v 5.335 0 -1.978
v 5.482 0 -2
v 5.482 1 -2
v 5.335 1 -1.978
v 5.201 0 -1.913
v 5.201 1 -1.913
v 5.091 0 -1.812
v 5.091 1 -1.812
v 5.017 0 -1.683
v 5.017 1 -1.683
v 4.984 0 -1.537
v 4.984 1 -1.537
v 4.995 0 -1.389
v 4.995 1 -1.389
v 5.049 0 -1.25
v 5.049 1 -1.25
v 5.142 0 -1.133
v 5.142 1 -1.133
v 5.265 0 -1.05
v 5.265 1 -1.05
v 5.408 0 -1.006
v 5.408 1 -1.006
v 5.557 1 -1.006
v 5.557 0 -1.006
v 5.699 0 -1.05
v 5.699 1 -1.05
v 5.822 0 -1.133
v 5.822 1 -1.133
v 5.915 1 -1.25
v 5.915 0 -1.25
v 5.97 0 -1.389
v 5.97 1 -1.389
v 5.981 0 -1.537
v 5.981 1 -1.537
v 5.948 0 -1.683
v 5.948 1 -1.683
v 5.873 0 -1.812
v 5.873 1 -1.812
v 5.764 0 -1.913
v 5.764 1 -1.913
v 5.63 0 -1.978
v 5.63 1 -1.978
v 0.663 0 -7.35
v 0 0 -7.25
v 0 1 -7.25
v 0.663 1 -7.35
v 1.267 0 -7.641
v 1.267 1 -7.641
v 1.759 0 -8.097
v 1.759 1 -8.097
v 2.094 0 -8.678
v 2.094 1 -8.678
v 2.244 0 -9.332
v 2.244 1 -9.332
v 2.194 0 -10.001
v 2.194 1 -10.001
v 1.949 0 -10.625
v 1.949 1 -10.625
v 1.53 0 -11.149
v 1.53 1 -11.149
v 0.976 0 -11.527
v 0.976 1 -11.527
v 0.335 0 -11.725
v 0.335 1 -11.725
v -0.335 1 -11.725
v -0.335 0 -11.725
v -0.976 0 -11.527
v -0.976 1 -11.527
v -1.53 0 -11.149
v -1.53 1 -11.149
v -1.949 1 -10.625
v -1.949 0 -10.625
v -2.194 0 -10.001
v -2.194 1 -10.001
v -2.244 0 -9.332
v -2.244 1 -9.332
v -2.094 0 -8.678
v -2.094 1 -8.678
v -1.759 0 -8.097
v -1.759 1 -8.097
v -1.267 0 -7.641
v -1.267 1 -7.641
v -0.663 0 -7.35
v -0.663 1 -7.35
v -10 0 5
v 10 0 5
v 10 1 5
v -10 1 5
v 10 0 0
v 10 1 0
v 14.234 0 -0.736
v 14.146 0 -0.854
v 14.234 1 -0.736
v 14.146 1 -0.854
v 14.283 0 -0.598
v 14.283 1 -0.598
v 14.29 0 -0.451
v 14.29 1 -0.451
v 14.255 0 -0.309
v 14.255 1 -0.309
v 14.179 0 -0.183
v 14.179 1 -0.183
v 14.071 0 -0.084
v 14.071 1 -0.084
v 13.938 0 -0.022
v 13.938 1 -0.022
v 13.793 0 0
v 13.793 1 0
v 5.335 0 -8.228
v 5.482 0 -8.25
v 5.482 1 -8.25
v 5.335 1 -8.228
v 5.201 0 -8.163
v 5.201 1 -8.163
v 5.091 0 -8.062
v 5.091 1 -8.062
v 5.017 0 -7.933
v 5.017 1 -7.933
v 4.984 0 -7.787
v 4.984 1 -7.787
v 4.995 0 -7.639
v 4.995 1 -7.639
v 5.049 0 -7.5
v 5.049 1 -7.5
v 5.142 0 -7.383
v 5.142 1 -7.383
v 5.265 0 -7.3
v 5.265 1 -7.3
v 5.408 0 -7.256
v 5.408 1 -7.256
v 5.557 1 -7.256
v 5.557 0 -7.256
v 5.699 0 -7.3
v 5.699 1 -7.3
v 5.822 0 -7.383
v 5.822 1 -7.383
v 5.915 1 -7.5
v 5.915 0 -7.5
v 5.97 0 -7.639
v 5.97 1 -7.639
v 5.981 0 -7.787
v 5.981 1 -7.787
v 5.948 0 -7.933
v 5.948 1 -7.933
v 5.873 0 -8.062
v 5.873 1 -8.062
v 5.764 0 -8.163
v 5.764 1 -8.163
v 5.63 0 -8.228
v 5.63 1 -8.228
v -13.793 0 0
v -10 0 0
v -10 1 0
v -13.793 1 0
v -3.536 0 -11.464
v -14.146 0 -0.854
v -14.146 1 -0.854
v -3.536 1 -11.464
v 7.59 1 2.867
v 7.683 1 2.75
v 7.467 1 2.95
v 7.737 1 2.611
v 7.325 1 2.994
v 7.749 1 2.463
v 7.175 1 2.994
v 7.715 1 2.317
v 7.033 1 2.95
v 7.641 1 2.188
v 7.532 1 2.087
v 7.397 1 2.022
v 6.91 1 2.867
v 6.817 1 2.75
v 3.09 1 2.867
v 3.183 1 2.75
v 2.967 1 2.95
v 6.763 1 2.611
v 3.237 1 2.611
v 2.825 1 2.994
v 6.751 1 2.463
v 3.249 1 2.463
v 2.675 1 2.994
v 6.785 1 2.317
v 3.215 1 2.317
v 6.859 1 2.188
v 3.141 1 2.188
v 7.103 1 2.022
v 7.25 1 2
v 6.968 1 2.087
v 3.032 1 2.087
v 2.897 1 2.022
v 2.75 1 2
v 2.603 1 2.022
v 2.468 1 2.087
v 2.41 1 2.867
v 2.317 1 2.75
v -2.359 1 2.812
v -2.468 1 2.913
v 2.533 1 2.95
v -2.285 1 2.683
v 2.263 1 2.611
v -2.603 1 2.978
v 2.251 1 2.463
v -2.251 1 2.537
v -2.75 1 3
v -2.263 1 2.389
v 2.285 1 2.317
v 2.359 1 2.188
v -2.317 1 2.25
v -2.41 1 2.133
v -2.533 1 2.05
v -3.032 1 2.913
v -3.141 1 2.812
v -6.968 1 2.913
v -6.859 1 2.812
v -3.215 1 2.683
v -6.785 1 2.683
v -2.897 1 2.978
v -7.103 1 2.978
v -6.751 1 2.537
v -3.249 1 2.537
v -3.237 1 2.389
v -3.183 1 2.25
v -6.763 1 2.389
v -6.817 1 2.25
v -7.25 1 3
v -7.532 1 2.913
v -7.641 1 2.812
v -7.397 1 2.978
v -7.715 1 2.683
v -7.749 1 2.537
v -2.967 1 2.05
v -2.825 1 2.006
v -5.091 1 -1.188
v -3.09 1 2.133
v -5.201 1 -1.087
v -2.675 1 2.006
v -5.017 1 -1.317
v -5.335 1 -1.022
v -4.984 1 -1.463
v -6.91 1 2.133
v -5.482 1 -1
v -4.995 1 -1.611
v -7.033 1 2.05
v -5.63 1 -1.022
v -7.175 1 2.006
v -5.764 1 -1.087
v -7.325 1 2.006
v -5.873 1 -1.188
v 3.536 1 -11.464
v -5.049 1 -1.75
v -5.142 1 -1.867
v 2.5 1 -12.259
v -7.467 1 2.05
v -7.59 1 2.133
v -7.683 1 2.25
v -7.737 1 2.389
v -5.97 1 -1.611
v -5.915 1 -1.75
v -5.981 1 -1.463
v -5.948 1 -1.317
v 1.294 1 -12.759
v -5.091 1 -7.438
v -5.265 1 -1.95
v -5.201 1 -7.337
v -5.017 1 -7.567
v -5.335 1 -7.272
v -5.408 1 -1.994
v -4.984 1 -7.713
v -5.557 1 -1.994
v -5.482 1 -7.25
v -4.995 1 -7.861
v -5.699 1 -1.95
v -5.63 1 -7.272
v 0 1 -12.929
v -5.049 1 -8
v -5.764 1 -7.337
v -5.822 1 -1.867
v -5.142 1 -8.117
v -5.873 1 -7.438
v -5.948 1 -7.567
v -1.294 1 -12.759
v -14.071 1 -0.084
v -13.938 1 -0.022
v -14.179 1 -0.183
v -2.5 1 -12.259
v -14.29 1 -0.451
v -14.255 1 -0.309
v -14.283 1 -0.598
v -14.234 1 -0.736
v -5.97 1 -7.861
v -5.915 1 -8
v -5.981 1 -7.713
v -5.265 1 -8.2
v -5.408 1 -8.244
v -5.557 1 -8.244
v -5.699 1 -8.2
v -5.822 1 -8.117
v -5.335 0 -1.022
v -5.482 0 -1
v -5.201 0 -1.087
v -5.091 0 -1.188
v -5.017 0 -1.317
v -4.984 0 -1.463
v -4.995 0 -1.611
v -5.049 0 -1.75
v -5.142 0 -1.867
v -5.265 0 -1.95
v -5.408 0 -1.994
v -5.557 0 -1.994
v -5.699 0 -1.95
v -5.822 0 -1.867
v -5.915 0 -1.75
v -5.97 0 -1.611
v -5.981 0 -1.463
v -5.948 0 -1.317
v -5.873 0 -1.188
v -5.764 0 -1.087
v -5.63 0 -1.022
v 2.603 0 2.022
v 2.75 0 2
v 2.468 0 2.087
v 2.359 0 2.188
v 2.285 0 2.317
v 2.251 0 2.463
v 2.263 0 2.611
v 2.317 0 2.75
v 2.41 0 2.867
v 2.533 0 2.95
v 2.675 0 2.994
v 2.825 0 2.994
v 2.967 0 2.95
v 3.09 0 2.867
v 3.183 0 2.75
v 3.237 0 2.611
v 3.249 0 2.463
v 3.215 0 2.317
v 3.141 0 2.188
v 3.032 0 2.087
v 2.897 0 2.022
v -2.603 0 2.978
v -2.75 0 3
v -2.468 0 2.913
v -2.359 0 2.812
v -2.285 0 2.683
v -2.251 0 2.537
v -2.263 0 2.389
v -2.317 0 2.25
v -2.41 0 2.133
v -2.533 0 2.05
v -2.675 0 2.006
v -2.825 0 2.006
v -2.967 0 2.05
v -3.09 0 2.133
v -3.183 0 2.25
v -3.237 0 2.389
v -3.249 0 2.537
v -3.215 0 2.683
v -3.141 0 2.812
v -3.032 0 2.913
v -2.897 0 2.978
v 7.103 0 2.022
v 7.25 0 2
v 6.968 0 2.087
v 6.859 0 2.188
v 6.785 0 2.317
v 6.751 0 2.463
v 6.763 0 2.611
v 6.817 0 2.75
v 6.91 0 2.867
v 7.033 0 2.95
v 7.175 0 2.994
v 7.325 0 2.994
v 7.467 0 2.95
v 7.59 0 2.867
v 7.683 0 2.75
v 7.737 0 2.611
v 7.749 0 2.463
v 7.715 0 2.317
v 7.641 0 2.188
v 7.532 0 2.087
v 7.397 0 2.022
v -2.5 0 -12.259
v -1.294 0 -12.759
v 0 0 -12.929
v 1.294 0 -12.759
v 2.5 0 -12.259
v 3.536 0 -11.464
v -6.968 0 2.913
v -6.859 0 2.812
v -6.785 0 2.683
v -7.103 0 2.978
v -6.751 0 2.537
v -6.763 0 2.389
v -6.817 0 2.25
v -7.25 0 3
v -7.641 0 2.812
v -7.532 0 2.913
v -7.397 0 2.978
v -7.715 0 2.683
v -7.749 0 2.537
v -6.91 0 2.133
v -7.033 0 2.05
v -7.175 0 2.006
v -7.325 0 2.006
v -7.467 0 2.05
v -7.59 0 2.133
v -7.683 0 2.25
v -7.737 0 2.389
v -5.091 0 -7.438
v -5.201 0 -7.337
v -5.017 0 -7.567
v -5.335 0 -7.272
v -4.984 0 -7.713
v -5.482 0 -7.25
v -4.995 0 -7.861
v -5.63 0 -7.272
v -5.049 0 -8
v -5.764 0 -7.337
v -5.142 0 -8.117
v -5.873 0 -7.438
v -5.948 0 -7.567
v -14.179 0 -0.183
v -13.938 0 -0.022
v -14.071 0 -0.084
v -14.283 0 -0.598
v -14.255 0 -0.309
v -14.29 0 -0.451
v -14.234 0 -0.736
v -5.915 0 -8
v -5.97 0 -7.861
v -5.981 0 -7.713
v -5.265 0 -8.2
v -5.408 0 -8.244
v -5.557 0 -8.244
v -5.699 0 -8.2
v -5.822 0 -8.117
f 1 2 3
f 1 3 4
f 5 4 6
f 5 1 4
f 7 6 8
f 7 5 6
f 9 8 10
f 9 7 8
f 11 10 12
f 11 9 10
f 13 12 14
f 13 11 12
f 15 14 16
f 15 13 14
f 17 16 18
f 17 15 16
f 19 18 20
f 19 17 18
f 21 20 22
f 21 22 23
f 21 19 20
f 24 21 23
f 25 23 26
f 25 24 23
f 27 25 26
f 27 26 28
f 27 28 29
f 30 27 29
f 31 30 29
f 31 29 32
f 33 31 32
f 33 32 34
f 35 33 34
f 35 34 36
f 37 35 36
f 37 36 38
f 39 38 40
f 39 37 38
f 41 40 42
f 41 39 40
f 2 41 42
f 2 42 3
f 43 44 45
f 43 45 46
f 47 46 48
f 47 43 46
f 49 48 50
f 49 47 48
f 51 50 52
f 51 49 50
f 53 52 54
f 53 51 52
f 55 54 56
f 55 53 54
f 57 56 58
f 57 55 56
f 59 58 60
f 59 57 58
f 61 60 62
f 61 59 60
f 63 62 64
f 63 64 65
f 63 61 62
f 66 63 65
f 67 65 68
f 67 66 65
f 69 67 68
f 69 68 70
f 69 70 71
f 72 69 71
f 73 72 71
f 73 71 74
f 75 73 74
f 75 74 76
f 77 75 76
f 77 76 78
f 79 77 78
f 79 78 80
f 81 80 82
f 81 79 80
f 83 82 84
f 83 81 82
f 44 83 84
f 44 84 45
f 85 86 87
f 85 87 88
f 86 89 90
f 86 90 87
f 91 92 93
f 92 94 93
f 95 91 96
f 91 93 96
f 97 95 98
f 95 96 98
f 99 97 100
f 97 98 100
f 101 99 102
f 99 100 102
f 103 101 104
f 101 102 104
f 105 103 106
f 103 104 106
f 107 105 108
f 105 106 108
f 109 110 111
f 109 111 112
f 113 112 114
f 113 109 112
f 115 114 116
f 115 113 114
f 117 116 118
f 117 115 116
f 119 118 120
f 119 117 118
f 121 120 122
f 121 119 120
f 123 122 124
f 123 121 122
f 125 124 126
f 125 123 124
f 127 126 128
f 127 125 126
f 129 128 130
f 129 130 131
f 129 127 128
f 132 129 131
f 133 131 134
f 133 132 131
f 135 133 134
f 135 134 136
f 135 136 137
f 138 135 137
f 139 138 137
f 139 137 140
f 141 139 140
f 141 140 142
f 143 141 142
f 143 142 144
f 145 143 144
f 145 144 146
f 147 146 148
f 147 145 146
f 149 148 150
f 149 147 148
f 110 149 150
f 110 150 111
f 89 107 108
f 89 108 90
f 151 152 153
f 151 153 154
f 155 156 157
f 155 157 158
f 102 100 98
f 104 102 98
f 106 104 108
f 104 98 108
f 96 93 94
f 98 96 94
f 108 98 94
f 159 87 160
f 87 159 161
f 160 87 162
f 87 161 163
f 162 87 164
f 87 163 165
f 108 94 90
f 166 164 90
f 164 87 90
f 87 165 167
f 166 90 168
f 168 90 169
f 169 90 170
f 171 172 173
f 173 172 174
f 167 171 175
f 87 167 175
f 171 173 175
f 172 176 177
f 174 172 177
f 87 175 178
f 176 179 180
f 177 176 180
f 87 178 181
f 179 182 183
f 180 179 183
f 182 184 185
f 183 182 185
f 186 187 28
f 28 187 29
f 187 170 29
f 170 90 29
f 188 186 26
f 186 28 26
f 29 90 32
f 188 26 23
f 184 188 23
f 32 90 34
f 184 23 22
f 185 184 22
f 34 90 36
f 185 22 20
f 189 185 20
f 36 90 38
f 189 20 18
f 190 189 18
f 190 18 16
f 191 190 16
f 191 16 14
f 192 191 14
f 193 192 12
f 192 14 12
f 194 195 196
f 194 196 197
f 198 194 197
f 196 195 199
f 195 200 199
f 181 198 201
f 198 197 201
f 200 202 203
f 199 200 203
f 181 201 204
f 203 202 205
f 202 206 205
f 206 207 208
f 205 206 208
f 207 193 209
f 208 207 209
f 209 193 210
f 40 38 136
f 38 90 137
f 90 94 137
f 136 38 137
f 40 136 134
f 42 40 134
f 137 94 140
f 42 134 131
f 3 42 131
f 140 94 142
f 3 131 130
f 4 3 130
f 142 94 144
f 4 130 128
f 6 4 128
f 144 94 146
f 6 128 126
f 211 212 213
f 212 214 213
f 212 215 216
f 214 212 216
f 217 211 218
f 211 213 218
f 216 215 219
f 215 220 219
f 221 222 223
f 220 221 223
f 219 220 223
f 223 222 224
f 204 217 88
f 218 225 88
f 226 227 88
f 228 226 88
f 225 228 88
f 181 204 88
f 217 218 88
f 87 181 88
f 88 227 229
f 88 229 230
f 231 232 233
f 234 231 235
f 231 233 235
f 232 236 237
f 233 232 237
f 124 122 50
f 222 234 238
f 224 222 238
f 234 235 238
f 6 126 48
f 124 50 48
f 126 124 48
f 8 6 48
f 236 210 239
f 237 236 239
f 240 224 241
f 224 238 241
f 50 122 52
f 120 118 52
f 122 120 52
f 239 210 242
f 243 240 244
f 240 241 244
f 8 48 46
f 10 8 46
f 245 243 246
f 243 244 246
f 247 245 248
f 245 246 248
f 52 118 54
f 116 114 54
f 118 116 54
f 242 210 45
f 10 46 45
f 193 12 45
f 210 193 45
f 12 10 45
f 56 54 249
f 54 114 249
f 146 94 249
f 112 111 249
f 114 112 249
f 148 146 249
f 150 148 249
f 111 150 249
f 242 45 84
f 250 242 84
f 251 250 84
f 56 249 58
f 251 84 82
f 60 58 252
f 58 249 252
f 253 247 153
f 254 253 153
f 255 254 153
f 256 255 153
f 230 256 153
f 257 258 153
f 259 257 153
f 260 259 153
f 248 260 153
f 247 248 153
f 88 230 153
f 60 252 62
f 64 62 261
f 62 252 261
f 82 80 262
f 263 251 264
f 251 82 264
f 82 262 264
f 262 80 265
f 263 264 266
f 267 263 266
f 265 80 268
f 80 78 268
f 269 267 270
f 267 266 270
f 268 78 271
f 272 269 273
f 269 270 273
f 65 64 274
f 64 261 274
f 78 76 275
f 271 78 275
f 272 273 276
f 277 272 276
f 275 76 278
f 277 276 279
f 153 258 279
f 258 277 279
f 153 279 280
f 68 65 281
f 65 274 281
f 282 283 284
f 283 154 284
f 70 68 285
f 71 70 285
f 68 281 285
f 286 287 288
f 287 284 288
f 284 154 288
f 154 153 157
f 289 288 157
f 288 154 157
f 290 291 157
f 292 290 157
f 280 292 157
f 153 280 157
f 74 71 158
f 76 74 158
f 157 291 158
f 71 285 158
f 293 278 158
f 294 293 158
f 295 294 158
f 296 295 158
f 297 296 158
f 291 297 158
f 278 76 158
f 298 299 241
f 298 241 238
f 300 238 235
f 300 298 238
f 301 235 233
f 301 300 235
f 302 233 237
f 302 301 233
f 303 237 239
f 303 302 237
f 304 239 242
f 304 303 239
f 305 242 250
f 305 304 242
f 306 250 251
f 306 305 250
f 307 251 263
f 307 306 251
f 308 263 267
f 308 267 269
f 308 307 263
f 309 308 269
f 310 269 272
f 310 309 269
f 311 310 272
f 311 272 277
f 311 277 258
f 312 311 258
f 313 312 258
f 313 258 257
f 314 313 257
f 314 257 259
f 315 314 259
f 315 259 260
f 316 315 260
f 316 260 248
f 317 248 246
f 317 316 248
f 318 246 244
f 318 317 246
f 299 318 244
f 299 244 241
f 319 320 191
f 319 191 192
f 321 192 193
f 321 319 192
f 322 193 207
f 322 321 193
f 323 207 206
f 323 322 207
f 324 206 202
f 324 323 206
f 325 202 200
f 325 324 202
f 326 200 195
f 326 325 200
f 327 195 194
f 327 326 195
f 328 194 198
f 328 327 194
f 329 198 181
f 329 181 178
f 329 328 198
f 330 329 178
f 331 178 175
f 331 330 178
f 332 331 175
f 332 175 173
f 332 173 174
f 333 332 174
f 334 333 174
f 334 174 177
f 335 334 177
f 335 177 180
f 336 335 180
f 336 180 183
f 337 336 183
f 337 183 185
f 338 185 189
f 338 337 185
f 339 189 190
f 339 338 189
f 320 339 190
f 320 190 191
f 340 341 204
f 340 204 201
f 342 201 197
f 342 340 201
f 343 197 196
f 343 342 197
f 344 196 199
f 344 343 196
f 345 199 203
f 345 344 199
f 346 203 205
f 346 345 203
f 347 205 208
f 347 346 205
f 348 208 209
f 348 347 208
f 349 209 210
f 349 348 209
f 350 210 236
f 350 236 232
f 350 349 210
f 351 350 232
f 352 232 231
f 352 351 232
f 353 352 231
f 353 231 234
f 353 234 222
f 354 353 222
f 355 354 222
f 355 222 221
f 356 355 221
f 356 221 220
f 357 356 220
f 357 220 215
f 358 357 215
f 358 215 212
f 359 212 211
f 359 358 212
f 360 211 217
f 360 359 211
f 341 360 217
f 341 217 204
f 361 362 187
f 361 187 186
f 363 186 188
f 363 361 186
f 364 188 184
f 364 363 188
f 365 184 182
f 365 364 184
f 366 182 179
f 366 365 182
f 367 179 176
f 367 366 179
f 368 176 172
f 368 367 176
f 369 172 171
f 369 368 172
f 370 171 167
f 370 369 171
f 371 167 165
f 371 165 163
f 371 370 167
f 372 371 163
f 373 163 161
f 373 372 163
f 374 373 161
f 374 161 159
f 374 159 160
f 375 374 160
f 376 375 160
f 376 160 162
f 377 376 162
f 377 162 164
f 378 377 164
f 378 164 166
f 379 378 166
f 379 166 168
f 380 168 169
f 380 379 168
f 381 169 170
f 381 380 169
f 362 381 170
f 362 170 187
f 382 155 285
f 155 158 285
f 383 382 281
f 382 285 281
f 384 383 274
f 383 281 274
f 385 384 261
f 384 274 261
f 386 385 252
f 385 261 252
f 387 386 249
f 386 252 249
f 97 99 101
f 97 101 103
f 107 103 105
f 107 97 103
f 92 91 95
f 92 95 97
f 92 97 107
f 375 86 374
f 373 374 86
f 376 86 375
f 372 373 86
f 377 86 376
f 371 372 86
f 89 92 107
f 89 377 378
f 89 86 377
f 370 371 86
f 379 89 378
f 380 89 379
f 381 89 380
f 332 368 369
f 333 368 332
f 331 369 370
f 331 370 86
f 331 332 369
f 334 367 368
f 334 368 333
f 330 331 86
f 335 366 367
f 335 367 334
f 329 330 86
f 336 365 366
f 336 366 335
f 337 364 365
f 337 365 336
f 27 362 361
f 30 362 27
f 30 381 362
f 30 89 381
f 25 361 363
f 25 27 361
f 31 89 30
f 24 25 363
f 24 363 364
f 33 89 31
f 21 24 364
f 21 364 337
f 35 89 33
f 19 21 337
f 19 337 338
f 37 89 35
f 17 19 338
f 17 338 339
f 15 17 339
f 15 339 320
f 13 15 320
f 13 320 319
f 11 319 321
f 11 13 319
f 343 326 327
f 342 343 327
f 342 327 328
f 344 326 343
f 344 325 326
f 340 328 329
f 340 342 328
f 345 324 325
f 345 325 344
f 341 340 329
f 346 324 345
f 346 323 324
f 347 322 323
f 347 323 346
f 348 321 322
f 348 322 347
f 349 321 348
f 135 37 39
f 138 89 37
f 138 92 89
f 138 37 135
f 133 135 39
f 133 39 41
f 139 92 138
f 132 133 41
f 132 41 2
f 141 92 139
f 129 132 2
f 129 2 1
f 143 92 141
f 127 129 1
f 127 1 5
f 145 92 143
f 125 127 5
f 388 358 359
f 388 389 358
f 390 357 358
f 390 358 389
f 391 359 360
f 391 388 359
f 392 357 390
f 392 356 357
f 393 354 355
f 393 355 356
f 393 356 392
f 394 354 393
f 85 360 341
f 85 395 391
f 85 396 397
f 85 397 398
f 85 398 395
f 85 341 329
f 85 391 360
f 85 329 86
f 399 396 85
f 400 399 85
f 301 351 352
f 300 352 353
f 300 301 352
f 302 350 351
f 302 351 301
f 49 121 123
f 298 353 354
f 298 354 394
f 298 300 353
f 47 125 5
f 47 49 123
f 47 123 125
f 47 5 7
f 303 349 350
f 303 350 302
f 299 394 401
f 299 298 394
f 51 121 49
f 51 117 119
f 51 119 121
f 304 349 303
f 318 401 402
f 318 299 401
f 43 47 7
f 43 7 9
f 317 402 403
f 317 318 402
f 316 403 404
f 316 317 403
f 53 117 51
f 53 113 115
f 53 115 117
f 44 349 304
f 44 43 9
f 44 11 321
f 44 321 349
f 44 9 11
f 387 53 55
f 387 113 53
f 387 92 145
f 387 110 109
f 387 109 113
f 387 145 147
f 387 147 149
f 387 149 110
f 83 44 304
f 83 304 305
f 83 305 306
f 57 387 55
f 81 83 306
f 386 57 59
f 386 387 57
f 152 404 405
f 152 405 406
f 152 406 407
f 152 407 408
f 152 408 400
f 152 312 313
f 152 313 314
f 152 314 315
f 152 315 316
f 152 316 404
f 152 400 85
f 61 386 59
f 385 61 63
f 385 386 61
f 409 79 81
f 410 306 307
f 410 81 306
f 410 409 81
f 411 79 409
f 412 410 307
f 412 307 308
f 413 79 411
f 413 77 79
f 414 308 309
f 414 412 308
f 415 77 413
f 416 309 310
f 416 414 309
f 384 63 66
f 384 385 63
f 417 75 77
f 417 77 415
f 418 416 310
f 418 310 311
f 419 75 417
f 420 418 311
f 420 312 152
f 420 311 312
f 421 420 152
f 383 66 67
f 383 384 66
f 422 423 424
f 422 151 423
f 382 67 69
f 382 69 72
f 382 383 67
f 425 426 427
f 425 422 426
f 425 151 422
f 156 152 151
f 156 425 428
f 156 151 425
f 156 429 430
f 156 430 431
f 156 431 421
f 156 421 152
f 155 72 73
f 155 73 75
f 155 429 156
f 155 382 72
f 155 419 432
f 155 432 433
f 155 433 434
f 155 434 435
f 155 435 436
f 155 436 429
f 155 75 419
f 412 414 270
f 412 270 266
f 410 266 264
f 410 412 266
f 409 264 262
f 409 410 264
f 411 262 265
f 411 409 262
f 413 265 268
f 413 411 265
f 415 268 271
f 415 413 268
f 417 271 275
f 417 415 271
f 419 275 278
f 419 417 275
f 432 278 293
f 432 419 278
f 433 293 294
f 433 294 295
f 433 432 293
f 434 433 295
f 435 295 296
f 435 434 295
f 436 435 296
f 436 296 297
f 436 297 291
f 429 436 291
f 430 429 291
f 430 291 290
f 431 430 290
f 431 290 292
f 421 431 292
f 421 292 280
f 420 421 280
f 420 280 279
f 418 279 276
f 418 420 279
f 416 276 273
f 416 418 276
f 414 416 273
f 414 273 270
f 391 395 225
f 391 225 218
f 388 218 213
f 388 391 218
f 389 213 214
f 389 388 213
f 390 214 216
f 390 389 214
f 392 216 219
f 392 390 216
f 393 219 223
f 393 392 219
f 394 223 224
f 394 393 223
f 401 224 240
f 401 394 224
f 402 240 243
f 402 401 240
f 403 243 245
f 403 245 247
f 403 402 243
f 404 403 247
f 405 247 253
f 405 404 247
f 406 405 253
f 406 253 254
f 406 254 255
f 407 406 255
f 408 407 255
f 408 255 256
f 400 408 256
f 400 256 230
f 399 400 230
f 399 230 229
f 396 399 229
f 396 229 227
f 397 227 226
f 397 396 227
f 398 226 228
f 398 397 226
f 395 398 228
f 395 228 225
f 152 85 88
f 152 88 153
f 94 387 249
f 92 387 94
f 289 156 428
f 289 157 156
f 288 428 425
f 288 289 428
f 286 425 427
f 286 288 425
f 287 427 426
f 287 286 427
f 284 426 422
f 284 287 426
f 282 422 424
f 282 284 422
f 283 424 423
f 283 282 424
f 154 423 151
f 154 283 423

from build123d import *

# Parameters (mm, degrees)
SKETCH_1_R      = 2.25
SKETCH_1_R_2    = 0.5
EXTRUDE_1_DEPTH = 1
FILLET_1_R      = 5
FILLET_3_R      = 0.5


with BuildPart() as part:
    # 草图1 → 凸台-拉伸1 (new body)
    with BuildSketch(Plane(origin=(0, 0, 0), x_dir=(1, 0, 0), z_dir=(0, 1, 0))):
        Polygon((-15, 0), (0, 15), (15, 0), (10, 0), (10, -5), (-10, -5), (-10, 0), align=None)
        with Locations(Location((0, 9.5, 0), (0, 0, 270))):
            Circle(SKETCH_1_R, mode=Mode.SUBTRACT)
        with Locations(Location((-5.482233047, 7.75, 0), (0, 0, 270))):
            Circle(SKETCH_1_R_2, mode=Mode.SUBTRACT)
        with Locations(Location((5.482233047, 7.75, 0), (0, 0, 90))):
            Circle(SKETCH_1_R_2, mode=Mode.SUBTRACT)
        with Locations(Location((-5.482233047, 1.5, 0), (0, 0, 270))):
            Circle(SKETCH_1_R_2, mode=Mode.SUBTRACT)
        with Locations(Location((5.482233047, 1.5, 0), (0, 0, 90))):
            Circle(SKETCH_1_R_2, mode=Mode.SUBTRACT)
        with Locations(Location((-7.25, -2.5, 0), (0, 0, 270))):
            Circle(SKETCH_1_R_2, mode=Mode.SUBTRACT)
        with Locations(Location((-2.75, -2.5, 0), (0, 0, 270))):
            Circle(SKETCH_1_R_2, mode=Mode.SUBTRACT)
        with Locations(Location((2.75, -2.5, 0), (0, 0, 90))):
            Circle(SKETCH_1_R_2, mode=Mode.SUBTRACT)
        with Locations(Location((7.25, -2.5, 0), (0, 0, 90))):
            Circle(SKETCH_1_R_2, mode=Mode.SUBTRACT)
    extrude(amount=EXTRUDE_1_DEPTH)

    # 圆角1
    fillet_1_edges = [part.edges().sort_by_distance(p)[0] for p in [
        (0, 0.5, -15),
    ]]
    fillet(fillet_1_edges, radius=FILLET_1_R)

    # 圆角3
    fillet_3_edges = [part.edges().sort_by_distance(p)[0] for p in [
        (-15, 0.5, 0),
        (15, 0.5, 0),
    ]]
    fillet(fillet_3_edges, radius=FILLET_3_R)


solid = part.part
